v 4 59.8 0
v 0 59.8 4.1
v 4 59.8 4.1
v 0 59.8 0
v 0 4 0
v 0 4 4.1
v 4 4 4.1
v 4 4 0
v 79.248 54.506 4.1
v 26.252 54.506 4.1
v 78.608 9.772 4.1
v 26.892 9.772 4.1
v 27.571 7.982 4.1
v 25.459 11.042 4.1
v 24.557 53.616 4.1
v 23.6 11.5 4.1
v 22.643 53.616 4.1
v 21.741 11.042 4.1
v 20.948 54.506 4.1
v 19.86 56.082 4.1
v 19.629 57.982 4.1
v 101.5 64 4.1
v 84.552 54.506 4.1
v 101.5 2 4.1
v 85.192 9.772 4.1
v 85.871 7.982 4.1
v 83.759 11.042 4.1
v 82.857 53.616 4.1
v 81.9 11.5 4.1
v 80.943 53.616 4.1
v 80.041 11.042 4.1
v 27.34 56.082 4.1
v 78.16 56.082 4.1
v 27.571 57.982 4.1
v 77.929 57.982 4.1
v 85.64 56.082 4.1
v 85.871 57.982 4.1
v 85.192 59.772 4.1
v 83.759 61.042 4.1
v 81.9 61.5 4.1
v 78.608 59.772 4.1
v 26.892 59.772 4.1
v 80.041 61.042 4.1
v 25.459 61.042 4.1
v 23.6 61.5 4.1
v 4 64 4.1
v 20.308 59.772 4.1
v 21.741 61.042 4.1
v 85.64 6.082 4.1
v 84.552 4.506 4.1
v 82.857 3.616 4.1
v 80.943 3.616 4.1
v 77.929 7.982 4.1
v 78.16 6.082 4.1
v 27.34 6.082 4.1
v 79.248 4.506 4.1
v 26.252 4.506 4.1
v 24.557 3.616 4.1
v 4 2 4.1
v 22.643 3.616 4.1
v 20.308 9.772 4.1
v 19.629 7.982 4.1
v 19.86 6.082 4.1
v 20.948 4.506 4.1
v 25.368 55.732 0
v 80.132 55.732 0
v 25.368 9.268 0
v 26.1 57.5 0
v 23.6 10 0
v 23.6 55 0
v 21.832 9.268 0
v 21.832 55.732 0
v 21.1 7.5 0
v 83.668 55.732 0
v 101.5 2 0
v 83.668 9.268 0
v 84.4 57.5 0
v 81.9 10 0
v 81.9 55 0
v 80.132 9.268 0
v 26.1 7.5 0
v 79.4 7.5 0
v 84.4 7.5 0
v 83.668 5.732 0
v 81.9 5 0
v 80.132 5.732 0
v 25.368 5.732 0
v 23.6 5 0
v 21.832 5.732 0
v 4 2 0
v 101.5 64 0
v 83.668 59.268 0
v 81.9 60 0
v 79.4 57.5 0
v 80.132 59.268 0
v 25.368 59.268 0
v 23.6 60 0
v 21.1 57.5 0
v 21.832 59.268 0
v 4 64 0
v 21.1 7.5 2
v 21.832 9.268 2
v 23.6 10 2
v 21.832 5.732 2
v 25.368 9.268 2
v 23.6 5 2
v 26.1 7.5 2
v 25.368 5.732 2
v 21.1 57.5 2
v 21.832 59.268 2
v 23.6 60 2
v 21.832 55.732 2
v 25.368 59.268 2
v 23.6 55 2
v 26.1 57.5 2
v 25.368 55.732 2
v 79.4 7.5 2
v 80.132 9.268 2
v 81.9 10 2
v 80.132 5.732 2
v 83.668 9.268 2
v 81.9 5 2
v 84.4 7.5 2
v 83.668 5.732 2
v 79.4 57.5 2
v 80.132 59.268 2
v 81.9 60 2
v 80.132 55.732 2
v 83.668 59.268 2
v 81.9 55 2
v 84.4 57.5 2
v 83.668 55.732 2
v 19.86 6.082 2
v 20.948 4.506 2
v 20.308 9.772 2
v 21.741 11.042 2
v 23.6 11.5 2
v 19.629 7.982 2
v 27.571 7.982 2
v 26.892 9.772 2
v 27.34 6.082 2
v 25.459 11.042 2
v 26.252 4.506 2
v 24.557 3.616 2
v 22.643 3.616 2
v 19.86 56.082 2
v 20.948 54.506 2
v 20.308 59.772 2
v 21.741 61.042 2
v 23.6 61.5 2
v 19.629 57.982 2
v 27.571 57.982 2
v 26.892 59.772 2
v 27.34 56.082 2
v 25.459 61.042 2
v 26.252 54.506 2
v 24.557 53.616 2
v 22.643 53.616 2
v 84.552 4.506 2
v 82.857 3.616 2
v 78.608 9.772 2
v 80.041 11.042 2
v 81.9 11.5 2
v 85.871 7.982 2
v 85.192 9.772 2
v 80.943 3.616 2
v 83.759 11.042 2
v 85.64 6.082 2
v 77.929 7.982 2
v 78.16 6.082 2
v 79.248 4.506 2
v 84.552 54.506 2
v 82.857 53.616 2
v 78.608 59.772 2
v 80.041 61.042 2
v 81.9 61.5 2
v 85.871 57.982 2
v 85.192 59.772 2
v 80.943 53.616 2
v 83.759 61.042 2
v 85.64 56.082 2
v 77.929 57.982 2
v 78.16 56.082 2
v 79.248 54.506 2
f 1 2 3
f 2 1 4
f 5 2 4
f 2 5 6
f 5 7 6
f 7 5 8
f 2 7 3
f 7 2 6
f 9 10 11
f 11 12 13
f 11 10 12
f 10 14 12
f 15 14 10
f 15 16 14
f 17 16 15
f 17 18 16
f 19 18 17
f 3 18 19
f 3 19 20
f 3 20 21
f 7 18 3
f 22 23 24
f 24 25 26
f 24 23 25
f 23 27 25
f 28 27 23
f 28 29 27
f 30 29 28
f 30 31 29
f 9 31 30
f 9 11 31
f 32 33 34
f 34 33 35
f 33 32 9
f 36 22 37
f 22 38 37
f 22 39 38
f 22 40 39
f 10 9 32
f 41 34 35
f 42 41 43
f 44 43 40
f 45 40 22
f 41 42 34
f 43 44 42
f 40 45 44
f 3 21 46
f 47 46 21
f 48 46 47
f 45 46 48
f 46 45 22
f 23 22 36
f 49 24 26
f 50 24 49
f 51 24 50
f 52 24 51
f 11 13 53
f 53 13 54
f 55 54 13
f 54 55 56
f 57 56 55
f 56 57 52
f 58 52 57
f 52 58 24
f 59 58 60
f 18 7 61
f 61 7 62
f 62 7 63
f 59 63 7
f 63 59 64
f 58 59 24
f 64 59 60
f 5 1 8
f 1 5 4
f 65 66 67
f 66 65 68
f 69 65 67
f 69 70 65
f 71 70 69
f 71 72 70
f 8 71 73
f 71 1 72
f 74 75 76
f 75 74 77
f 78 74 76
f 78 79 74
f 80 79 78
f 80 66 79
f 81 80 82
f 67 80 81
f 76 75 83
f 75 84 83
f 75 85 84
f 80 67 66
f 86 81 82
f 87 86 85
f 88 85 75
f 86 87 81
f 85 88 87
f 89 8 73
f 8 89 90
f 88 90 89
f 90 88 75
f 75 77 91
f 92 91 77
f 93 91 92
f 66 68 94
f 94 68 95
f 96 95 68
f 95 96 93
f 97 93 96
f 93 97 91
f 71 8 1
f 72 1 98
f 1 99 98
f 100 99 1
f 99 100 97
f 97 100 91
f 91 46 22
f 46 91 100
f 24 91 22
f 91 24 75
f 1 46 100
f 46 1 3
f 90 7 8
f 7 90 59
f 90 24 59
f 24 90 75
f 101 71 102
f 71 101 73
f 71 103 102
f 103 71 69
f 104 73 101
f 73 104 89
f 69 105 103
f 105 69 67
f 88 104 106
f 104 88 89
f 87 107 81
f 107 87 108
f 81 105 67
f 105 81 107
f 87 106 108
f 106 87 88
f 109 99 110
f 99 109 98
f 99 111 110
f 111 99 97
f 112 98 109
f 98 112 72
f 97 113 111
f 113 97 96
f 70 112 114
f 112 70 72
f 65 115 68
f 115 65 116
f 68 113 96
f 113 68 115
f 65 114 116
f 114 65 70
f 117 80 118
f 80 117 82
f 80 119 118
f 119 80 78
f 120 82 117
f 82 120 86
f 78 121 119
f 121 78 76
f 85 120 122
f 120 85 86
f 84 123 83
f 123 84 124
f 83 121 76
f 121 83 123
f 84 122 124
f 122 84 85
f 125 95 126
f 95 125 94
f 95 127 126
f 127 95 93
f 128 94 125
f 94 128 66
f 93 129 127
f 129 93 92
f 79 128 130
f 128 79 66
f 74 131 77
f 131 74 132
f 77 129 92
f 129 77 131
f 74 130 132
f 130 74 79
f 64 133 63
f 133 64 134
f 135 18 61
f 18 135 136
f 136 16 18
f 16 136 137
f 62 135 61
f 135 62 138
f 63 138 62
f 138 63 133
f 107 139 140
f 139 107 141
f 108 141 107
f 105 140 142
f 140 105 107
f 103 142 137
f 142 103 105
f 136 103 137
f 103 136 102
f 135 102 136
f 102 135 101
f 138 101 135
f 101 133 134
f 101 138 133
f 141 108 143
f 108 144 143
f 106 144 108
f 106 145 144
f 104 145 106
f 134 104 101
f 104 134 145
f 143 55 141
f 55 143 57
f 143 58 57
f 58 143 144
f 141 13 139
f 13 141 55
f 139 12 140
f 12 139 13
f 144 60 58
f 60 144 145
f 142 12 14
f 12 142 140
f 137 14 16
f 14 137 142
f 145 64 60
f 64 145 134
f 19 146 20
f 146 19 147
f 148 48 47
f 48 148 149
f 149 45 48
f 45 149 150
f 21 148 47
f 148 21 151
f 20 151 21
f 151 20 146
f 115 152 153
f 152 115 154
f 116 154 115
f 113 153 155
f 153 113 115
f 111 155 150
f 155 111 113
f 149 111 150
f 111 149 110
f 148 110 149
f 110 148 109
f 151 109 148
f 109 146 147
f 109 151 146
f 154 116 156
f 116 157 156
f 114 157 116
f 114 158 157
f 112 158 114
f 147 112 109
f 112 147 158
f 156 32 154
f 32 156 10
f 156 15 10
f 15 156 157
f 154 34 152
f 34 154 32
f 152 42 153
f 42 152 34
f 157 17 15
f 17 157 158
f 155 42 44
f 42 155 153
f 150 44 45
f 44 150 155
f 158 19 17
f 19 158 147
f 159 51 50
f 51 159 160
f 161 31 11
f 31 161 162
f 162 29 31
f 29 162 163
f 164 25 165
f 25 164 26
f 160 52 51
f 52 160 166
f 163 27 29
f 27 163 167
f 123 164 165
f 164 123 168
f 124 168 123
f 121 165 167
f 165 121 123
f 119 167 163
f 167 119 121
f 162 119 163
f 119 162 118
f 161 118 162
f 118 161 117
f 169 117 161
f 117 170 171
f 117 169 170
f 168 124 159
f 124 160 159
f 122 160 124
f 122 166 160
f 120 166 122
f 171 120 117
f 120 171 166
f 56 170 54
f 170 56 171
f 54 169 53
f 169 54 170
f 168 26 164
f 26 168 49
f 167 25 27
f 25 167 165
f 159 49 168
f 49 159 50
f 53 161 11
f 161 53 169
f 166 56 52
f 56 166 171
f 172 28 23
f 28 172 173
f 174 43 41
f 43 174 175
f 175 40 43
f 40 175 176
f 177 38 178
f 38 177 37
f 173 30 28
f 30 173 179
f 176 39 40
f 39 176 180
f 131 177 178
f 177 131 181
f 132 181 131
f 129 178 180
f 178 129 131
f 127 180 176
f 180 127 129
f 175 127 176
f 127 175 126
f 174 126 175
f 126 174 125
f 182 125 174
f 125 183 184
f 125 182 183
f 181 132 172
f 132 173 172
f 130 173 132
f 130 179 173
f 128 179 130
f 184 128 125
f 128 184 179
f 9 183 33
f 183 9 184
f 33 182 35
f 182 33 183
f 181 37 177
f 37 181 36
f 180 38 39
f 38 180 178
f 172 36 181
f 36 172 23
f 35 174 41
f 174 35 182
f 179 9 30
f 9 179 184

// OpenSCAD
// file: ../../library.scad
module tubo(
	h/*Altura*/,
	w/*Pared*/,
	d/*Diametro*/
){
  difference()
  {
    cylinder(r=(d/2), h);
    translate([0,0,-0.1])
    cylinder(r=(d/2)-(2*w), h+0.2);
  }
}

module huyoMasPared(
	d/*Diametro del hoyo*/,
	w/*Pared*/,
	h/*Altura*/,
){
  difference()
  {
    cylinder(r=((d+(2*w))/2), h);
    translate([0,0,-0.1])
    cylinder(r=(d/2), h+0.2);
  }
}

module cuboMasPared(
    w1, //Largo
    w2, //Ancho
    p1, //Pared
    p2, //Pared
    h   //Alto
)
{    
    difference()
    {
        translate([-(w1+(p1*2))/2,-(w2+(p2*2))/2,0])
        cube([(w1+(p1*2)),(w2+(p2*2)),h]);
        
        translate([-w1/2,-w2/2,-0.2])
        cube([w1,w2,h*2]);
        
    }
    
    
}

soporteW = 0.7;

module soporteCylinder()
{
  difference()
  {
	cylinder(r=radio,altura);

	translate([0,0,-0.1])
	cylinder(r=radio-soporteW,altura+0.2);
  }

  if(true){
  difference()
  {
	cylinder(r=radio+0.75,1);

	translate([0,0,-0.1])
	cylinder(r=radio-0.75,1.25);
  }}

}

module soporteOval()
{
  difference()
  {
	oval(w=ancho, h=largo, height=alto, center = false);

	translate([0,0,-0.1])
	oval(ancho-soporteW, largo, alto+0.2);
  }

  difference()
  {
	oval(w=ancho+1, h=largo+1, height=1, center = false);

	translate([0,0,-0.1])
	oval(w=ancho-1, h=largo-1, height=1.25, center = false);
  }

}


module oval(w,h, height, center = false)
{
  scale([1, h/w, 1]) cylinder(h=height, r=w, center=center);
}
// file: Tapa.scad
batX = 0;//22.4Ancho frente
batY = 21.4;//Alto frente
batZ = 90.5;//Profundo


pared = 4;
pared2 = 2*pared;
medPared = pared/2;

raspX = 58;
raspY = 18;
raspZ = 84.5;

h = batY+pared2;

mainAreaX = raspX+batX+pared2; 
mainAreaY = batY+pared2;
mainAreaZ = batZ+pared+5+4;

mainAreaIntX = mainAreaX-pared2;
mainAreaIntY = mainAreaY-pared;
mainAreaIntZ = mainAreaZ-pared;

x1 = pared+3.5;
z1 = 23.6;
x2 = x1+50;
x3 = pared+3.5;
z3 = 81.9;

cejaHorPosX = mainAreaX-batX-pared;
cejaVertPosX = mainAreaX-pared-2;
torH = batY+pared;


rotate([90,0,90])
doALl();



module doALl(){
difference()
{
	translate([medPared,0,pared])
	doTop();	

	translate([0,-1,0])
	baseBatTorn(2.5);

	translate([0,2,0])
	baseBatTorn(4);

}
}

module doTop()
{
	translate([2,0,-4])
	cube([
			mainAreaX-pared-6.2,
			pared+0.1,
			mainAreaZ-pared2+medPared
	  	]);
	cube([
			mainAreaX-pared,
			pared+0.1,
			mainAreaZ-pared2+medPared
	  	]);
}



module baseBatTorn(r)
{
//Tornillos
translate([x1,0,z1])
tornCyl(r);
translate([x2,0,z1])
tornCyl(r);
translate([x1,0,z3])
tornCyl(r);
translate([x2,0,z3])
tornCyl(r);
}











module tornCyl(rad)
{
	rotate([-90,0,0])
	{
		cylinder(r=rad,torH);
	}
}
// main file
include <Tapa.scad>
include <../../library.scad>


bigW = 70;
ori = bigW/2;
raspSellR = 59;
tuboH = 140;
H = 18.5;
selloH = 7;
tornR = 2;

huecoPared = 12;
huecoH = 22;


if(false)
{
translate([0,0,H])
rotate([0,180,0])
diffracter();


//soporteCylinder(radio=25.2,altura=3.8);

}


module diffracter(){	

difference(){

//Bloque
translate([-bigW/2,-bigW/2,0])
cube([bigW,bigW,H]);


translate([
						-(bigW-huecoPared)/2,
						-(bigW-huecoPared)/2,
						(huecoH/2)
					])
		cube([
					bigW-huecoPared,
					bigW-huecoPared,
					H-huecoH]
				);


//Diffractador
translate([-27.25,-32.5,-0.1])
cube([54.5,65,5.6]);

//Macro
translate([0,0,5.4])
cylinder(r=(54.5/2),8.2);

//Sello de raspberry
//translate([0,0,-0.1])
//cylinder(r=(raspSellR/2)+1,2);

//Tubo
//translate([0,0,-0.1])
//cylinder(r=(52/2),200);

//Tornillos abajo
translate([-ori+4,-ori+4,-0.1])
cylinder(r=tornR,20);
translate([ori-4,-ori+4,-0.1])
cylinder(r=tornR,20);
translate([-ori+4,ori-4,-0.1])
cylinder(r=tornR,20);
translate([ori-4,ori-4,-0.1])
cylinder(r=tornR,20);

//Hueco
cylinder(r=25.5,H+1);

//Tornillos caja
translate([0,0,(tuboH/2)-7])
rotate([0,90,0])
tornillosArriba();

//Tornillo tripie
translate([-ori-0.1,0,(tuboH/2)+7])
rotate([0,90,0])
cylinder(r=5/2,5.31);

//Sello hembra
translate([0,0,H-3])
cylinder(r=30,4);

}

//Sello cobertura
//translate([0,0,H-1])
//huyoMasPared(58,3,3);


}
